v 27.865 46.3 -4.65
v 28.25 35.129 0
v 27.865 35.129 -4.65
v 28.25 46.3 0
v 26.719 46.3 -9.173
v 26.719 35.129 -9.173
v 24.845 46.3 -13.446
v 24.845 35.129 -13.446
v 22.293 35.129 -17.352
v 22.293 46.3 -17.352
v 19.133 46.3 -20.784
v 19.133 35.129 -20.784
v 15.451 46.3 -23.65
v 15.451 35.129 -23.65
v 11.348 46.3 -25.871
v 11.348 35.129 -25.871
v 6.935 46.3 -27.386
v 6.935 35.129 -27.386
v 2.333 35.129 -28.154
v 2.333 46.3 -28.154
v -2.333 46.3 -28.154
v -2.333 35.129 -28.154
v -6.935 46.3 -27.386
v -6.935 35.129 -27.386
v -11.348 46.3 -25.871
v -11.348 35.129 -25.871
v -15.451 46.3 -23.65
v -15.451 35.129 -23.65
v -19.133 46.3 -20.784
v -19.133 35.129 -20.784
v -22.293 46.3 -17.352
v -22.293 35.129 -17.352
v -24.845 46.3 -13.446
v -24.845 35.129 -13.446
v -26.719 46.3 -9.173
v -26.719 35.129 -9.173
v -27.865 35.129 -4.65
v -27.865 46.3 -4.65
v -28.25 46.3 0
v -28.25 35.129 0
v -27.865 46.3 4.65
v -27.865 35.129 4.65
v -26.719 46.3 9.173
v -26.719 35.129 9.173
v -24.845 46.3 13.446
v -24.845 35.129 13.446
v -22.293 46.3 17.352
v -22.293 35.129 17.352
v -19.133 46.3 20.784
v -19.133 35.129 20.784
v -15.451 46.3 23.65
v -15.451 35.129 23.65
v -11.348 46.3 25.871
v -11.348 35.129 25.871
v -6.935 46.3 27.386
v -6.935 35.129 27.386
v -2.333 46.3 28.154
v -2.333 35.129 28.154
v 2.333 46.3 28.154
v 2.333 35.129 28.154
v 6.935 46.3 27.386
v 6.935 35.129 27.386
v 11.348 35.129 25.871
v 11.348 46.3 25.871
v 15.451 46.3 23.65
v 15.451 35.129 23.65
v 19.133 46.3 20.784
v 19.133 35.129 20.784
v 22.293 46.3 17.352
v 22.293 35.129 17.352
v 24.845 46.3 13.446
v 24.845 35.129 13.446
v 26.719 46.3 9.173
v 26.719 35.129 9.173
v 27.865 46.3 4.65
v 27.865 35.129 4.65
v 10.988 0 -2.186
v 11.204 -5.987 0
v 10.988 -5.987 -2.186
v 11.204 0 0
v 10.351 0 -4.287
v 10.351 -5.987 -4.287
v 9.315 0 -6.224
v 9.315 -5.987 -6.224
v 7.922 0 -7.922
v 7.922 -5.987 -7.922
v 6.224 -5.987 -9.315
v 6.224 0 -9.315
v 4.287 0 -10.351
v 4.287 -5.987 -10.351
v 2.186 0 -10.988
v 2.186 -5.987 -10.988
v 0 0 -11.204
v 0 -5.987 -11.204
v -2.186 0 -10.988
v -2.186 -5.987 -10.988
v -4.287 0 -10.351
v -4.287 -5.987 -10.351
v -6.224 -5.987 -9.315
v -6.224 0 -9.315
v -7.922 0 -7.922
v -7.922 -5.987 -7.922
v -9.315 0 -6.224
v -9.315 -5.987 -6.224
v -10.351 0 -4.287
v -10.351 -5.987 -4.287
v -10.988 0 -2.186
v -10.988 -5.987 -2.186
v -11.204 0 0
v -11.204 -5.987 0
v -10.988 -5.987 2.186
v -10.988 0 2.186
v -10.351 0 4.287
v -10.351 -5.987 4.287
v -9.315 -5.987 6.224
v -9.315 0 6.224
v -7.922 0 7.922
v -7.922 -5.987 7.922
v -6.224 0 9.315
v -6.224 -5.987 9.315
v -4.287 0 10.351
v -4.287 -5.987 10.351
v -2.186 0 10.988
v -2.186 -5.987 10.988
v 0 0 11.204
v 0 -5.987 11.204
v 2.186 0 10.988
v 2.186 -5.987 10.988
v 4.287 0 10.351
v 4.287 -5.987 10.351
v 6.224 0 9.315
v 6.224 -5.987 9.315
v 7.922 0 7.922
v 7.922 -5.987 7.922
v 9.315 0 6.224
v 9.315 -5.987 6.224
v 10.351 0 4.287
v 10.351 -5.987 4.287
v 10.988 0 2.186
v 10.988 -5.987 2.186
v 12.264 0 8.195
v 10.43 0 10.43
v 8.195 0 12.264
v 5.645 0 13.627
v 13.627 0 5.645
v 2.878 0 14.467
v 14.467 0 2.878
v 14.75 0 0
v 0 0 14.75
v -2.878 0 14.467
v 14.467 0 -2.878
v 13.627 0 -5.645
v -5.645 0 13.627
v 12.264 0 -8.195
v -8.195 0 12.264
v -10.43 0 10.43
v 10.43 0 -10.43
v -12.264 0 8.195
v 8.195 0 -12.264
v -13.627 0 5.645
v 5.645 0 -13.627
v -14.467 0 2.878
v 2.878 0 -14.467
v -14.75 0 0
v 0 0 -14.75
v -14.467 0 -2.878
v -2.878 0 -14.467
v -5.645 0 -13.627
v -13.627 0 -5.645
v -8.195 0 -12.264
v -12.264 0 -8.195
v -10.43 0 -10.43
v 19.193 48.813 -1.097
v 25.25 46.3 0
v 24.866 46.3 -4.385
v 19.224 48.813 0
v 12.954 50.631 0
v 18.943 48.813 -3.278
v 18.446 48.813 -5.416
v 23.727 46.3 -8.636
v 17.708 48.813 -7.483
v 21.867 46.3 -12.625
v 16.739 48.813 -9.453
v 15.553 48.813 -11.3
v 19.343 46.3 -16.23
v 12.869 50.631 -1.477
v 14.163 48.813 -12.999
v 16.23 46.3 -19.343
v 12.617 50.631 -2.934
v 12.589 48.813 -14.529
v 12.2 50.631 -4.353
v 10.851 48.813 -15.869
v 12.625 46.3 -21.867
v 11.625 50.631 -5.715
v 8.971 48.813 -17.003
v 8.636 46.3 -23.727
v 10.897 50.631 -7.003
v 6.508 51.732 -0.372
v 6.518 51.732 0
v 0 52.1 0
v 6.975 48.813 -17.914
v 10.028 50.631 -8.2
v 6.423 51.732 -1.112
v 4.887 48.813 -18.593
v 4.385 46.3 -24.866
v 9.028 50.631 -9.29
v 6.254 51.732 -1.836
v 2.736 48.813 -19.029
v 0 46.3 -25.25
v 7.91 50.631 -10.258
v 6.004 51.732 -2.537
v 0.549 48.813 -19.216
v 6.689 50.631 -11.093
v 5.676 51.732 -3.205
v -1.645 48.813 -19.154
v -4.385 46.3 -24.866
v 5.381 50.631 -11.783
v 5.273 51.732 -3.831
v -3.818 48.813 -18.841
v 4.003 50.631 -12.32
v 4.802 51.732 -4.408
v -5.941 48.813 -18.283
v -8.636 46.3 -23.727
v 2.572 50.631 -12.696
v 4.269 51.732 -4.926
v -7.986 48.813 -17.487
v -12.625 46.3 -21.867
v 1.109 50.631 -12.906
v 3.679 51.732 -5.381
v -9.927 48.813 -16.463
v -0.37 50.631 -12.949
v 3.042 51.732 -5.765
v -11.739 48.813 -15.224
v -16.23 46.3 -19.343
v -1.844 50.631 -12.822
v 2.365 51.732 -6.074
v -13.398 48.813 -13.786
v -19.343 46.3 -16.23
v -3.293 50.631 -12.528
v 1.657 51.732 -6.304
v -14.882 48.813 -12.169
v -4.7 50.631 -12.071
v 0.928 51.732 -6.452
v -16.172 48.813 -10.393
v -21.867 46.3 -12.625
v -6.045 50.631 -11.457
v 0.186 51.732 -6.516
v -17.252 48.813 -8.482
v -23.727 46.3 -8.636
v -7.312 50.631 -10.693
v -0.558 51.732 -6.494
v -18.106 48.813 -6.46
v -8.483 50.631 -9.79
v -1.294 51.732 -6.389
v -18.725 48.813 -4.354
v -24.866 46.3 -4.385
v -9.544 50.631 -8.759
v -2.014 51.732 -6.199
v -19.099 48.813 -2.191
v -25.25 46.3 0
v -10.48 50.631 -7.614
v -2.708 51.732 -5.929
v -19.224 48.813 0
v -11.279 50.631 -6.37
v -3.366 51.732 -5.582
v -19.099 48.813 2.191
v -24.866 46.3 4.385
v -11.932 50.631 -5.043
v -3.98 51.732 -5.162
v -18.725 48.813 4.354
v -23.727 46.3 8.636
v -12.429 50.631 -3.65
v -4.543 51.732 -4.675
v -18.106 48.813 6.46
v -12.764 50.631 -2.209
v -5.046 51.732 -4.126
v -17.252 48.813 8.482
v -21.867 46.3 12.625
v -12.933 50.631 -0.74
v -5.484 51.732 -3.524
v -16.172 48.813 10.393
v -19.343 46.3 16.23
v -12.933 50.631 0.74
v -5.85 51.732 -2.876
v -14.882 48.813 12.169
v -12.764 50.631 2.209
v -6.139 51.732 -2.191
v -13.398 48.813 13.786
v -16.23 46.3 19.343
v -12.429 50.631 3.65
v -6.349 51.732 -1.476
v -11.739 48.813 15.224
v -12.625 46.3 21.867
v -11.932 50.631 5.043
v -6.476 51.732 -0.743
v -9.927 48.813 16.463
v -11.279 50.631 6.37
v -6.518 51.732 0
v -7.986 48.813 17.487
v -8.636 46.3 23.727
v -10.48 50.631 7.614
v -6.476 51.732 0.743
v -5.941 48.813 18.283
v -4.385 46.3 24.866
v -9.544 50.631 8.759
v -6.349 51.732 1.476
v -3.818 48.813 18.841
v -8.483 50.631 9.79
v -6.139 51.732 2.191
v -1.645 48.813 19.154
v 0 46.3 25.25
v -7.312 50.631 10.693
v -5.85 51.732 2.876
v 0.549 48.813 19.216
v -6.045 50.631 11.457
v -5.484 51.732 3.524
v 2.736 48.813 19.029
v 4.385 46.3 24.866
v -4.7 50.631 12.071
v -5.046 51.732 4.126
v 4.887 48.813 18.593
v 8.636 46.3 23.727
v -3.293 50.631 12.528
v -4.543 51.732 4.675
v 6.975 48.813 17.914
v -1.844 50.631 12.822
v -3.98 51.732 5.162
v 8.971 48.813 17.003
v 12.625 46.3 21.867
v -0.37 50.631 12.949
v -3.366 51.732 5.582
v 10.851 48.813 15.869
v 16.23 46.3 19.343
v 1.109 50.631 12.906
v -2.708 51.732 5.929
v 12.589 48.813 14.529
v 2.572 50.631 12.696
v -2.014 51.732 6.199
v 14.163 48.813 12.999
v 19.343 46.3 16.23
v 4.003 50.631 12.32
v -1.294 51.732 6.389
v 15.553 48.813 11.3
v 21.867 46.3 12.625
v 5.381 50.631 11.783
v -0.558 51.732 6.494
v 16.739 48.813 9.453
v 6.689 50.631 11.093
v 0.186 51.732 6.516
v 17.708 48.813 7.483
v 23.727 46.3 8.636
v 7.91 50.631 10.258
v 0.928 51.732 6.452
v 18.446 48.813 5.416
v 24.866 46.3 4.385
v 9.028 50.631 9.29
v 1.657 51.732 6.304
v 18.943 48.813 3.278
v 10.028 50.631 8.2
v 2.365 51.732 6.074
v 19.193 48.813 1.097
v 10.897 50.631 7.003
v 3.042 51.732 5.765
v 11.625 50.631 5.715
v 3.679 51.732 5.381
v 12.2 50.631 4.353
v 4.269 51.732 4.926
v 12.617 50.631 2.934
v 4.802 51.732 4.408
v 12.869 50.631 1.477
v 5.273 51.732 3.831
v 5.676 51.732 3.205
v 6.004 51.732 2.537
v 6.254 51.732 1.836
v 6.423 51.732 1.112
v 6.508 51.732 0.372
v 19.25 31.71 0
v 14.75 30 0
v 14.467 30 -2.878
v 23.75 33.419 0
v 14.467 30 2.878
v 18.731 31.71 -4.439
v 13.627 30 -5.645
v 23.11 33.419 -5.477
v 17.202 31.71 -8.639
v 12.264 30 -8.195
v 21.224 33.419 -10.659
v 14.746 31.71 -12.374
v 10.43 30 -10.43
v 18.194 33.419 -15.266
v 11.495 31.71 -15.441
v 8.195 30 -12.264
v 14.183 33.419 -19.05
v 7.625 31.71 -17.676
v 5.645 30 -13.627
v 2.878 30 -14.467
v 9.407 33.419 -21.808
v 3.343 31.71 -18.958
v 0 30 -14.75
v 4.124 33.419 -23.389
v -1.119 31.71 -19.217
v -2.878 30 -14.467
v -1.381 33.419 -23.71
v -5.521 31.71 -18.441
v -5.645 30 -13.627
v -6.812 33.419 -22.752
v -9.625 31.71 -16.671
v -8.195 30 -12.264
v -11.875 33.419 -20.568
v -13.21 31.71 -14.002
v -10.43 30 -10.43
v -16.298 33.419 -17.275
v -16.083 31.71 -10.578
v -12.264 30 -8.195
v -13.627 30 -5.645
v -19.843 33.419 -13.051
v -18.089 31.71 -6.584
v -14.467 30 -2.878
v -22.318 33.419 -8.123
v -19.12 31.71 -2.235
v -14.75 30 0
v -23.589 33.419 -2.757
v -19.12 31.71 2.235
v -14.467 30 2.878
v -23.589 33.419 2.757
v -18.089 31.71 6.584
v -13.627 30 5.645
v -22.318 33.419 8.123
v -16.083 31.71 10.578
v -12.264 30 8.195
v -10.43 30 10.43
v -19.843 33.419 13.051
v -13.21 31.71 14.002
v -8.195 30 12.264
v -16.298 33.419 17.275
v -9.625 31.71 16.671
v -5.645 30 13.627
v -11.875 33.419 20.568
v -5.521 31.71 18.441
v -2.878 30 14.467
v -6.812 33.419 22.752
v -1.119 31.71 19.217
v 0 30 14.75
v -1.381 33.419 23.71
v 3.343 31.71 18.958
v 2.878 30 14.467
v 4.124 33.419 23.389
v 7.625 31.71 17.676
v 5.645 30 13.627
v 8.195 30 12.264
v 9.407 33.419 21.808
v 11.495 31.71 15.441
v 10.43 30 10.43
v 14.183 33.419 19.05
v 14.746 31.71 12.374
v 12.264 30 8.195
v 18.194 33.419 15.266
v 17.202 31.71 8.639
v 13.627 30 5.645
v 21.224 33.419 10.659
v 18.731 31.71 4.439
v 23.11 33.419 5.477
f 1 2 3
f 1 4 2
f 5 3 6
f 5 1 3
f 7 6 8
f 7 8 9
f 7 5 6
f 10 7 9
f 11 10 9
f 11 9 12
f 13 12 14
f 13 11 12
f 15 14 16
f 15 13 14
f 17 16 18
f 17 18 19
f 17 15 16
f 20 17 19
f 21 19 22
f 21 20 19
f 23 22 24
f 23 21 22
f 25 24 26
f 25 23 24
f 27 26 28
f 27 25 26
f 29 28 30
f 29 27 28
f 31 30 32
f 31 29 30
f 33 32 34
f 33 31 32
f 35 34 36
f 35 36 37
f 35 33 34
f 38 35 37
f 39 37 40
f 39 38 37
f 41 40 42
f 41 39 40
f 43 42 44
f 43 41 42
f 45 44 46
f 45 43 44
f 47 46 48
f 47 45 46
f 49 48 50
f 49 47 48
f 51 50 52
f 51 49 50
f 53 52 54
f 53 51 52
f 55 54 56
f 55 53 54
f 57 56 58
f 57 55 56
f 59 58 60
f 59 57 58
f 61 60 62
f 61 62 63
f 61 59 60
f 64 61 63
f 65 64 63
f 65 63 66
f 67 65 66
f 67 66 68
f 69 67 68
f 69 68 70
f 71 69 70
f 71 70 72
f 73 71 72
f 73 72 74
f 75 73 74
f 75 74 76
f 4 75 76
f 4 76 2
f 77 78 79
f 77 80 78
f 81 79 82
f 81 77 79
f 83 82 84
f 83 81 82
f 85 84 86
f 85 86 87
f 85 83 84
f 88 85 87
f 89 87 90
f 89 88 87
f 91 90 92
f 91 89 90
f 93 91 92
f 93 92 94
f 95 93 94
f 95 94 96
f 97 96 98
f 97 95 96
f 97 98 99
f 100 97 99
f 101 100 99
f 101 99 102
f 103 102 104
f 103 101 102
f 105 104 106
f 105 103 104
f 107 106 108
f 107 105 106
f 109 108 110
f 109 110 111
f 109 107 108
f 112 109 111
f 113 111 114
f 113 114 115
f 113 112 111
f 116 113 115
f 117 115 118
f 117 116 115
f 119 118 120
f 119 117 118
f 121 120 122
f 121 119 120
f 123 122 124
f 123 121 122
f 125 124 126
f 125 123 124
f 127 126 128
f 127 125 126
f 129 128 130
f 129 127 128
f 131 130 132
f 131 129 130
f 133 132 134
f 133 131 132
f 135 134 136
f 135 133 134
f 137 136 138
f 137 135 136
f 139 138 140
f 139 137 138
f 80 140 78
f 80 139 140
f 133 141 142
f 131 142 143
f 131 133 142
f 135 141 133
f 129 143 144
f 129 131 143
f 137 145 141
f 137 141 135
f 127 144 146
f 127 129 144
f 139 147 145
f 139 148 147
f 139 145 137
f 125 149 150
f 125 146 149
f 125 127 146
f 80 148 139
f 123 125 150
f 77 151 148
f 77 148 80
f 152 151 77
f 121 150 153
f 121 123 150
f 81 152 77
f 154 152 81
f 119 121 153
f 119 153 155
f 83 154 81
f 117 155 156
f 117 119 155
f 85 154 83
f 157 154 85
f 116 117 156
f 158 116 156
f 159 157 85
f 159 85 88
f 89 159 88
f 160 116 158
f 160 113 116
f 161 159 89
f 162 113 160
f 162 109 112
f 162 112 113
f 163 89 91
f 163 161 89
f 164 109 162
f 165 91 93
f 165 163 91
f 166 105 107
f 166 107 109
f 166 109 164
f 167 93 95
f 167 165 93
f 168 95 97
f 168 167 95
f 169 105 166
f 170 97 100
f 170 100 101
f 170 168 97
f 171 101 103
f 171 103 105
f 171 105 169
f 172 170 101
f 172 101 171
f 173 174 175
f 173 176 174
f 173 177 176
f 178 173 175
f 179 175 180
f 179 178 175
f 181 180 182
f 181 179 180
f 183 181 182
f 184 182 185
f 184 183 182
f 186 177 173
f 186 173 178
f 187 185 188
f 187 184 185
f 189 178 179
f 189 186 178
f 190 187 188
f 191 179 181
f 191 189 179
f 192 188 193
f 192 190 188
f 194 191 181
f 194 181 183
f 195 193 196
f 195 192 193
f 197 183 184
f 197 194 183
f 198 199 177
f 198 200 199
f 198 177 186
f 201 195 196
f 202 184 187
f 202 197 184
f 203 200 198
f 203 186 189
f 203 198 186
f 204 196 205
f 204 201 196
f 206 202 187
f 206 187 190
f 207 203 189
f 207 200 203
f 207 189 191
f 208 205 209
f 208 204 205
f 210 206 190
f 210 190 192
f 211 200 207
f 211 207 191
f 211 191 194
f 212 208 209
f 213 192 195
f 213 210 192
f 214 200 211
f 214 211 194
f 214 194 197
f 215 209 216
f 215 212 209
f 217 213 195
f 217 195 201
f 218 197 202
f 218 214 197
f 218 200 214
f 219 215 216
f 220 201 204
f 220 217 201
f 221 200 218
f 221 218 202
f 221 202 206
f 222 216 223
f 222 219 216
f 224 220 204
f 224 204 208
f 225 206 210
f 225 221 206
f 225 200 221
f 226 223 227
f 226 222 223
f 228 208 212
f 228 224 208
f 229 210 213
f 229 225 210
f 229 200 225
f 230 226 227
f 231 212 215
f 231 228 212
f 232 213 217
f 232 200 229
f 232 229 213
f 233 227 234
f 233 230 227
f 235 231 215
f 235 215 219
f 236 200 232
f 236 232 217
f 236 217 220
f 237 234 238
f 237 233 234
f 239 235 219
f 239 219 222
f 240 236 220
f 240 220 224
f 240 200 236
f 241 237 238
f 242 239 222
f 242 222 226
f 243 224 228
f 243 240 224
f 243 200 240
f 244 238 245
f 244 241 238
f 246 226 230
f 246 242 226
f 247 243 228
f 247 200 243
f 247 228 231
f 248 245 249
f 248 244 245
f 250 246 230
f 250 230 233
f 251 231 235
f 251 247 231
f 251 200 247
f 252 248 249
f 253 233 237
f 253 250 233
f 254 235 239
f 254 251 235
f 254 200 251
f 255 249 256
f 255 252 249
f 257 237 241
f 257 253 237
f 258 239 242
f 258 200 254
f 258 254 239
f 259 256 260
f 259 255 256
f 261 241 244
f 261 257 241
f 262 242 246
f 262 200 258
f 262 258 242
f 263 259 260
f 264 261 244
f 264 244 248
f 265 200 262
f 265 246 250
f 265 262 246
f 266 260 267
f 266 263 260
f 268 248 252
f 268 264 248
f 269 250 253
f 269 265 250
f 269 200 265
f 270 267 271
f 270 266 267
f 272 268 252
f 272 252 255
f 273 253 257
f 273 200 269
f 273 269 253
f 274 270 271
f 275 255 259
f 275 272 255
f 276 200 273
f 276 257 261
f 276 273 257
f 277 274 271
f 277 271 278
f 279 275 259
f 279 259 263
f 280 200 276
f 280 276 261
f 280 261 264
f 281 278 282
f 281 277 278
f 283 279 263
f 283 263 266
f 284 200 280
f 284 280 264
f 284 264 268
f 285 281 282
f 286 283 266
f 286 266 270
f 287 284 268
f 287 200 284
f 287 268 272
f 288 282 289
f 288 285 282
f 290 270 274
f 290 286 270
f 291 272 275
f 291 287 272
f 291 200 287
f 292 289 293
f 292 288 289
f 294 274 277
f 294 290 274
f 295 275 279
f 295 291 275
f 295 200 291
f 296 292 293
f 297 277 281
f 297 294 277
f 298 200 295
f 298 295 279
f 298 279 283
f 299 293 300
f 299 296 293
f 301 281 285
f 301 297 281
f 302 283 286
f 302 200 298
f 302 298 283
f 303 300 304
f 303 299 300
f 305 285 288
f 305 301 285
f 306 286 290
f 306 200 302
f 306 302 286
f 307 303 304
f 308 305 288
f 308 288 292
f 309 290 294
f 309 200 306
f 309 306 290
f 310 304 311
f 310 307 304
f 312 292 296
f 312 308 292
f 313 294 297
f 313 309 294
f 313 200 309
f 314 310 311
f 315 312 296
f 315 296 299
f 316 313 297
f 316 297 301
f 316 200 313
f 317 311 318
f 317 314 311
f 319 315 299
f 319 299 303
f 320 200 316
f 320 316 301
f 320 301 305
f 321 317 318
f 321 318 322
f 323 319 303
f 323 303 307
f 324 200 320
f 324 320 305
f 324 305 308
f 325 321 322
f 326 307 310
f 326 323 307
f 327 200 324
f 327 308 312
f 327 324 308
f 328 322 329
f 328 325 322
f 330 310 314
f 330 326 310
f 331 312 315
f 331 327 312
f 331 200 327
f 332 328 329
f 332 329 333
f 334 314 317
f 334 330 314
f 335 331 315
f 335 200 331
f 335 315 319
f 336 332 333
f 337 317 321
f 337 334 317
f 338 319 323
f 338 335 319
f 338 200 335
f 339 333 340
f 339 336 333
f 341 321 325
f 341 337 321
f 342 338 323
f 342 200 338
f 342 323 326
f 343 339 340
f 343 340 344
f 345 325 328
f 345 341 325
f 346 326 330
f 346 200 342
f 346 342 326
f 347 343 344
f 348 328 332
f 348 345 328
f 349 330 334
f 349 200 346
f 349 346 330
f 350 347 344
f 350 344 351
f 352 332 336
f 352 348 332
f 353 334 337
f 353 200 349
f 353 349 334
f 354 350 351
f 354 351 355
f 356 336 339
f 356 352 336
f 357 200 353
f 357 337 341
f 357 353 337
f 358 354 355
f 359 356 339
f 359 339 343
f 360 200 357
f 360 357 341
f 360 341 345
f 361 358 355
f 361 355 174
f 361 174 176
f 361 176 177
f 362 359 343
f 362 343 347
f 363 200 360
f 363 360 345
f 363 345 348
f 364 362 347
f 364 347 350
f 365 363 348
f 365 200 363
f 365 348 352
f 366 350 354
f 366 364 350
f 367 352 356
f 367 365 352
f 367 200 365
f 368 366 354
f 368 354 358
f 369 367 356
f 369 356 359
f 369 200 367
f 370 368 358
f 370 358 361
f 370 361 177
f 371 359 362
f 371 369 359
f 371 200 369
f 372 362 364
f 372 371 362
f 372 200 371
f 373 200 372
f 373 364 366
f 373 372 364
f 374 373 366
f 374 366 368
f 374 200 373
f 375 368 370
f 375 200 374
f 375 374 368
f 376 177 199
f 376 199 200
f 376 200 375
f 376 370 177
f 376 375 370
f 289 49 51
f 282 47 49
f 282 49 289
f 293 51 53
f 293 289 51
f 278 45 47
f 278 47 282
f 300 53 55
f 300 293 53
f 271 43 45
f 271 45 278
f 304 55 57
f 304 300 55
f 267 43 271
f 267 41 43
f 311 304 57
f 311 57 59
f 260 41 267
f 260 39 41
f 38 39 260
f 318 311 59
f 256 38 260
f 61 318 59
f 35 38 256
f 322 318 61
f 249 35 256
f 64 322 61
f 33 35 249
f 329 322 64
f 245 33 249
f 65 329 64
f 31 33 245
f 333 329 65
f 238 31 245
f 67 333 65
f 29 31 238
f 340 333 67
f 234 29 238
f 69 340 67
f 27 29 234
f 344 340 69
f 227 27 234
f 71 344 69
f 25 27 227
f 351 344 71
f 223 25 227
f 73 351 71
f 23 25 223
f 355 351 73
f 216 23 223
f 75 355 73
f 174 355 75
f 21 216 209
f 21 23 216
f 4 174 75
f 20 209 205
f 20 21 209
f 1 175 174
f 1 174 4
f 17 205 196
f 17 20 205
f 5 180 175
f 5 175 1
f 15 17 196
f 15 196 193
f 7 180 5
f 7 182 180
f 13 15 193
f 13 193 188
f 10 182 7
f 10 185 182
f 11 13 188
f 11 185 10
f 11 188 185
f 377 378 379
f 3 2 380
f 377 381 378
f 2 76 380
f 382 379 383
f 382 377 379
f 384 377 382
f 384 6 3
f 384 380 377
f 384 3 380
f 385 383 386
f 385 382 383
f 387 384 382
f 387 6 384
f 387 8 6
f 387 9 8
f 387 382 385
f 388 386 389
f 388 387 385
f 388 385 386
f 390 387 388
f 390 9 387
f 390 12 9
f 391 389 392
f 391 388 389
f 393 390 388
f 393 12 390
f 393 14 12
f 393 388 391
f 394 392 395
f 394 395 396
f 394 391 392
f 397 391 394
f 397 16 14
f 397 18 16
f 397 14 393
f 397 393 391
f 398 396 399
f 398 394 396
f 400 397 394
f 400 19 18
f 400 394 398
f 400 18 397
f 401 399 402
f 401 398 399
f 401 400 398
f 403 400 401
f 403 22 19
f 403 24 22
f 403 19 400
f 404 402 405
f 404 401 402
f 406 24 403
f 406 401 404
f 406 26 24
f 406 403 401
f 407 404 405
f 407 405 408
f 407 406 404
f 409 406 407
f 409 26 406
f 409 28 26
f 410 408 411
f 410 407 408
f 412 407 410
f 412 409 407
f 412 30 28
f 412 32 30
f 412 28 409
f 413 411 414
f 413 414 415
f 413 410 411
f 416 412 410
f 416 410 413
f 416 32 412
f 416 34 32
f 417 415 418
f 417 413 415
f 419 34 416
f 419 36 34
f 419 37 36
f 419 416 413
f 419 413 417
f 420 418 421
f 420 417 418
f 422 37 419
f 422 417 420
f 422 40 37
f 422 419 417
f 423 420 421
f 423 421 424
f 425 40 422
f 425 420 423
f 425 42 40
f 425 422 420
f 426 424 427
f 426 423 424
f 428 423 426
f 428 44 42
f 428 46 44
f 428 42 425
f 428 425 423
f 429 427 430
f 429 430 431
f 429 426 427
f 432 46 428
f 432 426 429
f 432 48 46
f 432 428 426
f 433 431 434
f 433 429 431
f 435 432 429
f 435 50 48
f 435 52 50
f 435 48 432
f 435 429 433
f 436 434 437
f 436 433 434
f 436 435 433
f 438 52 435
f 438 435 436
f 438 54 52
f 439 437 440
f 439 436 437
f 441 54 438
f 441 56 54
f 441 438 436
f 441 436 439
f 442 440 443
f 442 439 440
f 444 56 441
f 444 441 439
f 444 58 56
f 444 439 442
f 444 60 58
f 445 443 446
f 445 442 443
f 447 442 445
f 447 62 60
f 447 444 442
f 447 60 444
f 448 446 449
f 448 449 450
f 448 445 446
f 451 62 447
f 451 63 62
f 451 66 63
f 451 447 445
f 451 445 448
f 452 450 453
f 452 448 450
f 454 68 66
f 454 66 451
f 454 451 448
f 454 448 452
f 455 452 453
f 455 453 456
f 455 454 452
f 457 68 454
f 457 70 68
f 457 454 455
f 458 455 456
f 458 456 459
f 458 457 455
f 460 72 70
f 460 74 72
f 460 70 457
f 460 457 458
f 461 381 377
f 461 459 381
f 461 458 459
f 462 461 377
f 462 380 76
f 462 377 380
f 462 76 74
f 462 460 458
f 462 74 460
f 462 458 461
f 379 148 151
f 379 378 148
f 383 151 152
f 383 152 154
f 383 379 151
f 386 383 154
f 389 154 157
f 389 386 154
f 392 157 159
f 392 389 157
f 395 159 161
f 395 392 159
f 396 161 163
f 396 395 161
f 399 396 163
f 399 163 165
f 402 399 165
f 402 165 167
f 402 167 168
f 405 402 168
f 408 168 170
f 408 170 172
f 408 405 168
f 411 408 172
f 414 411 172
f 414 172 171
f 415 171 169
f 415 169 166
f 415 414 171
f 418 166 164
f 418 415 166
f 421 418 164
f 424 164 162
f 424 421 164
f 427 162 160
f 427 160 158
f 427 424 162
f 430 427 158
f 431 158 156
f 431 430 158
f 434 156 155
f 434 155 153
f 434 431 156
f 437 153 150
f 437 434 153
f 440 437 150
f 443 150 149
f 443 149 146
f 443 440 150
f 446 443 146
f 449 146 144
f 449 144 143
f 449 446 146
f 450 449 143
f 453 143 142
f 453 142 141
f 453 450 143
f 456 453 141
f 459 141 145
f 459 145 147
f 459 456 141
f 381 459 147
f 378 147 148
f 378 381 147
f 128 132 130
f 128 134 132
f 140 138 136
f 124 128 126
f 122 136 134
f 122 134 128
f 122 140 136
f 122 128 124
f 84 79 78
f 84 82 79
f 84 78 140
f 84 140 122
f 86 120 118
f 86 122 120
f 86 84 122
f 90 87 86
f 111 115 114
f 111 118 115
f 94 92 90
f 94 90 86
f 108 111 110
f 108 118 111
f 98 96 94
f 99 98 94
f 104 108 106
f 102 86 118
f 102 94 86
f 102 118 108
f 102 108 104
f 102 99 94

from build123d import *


with BuildPart() as part:
    # Esquisse1 → Révolution1 (revolve)
    with BuildSketch(Plane.XY):
        with BuildLine():
            Line((14.75, 0), (14.75, 30))
            Line((14.75, 30), (28.25, 35.128931493))
            Line((28.25, 35.128931493), (28.25, 46.3))
            Line((28.25, 46.3), (25.25, 46.3))
            ThreePointArc((25.25, 46.3), (12.953788056, 50.631361796), (0, 52.1))
            Line((0, 52.1), (0, 46.3))
            Line((0, 46.3), (0, -5.98683287))
            Line((0, -5.98683287), (11.203629045, -5.98683287))
            Line((11.203629045, -5.98683287), (11.203629045, 0))
            Line((11.203629045, 0), (14.75, 0))
        make_face()
    revolve(axis=Axis((0, 46.3, 0), (0, 1, 0)))


solid = part.part
